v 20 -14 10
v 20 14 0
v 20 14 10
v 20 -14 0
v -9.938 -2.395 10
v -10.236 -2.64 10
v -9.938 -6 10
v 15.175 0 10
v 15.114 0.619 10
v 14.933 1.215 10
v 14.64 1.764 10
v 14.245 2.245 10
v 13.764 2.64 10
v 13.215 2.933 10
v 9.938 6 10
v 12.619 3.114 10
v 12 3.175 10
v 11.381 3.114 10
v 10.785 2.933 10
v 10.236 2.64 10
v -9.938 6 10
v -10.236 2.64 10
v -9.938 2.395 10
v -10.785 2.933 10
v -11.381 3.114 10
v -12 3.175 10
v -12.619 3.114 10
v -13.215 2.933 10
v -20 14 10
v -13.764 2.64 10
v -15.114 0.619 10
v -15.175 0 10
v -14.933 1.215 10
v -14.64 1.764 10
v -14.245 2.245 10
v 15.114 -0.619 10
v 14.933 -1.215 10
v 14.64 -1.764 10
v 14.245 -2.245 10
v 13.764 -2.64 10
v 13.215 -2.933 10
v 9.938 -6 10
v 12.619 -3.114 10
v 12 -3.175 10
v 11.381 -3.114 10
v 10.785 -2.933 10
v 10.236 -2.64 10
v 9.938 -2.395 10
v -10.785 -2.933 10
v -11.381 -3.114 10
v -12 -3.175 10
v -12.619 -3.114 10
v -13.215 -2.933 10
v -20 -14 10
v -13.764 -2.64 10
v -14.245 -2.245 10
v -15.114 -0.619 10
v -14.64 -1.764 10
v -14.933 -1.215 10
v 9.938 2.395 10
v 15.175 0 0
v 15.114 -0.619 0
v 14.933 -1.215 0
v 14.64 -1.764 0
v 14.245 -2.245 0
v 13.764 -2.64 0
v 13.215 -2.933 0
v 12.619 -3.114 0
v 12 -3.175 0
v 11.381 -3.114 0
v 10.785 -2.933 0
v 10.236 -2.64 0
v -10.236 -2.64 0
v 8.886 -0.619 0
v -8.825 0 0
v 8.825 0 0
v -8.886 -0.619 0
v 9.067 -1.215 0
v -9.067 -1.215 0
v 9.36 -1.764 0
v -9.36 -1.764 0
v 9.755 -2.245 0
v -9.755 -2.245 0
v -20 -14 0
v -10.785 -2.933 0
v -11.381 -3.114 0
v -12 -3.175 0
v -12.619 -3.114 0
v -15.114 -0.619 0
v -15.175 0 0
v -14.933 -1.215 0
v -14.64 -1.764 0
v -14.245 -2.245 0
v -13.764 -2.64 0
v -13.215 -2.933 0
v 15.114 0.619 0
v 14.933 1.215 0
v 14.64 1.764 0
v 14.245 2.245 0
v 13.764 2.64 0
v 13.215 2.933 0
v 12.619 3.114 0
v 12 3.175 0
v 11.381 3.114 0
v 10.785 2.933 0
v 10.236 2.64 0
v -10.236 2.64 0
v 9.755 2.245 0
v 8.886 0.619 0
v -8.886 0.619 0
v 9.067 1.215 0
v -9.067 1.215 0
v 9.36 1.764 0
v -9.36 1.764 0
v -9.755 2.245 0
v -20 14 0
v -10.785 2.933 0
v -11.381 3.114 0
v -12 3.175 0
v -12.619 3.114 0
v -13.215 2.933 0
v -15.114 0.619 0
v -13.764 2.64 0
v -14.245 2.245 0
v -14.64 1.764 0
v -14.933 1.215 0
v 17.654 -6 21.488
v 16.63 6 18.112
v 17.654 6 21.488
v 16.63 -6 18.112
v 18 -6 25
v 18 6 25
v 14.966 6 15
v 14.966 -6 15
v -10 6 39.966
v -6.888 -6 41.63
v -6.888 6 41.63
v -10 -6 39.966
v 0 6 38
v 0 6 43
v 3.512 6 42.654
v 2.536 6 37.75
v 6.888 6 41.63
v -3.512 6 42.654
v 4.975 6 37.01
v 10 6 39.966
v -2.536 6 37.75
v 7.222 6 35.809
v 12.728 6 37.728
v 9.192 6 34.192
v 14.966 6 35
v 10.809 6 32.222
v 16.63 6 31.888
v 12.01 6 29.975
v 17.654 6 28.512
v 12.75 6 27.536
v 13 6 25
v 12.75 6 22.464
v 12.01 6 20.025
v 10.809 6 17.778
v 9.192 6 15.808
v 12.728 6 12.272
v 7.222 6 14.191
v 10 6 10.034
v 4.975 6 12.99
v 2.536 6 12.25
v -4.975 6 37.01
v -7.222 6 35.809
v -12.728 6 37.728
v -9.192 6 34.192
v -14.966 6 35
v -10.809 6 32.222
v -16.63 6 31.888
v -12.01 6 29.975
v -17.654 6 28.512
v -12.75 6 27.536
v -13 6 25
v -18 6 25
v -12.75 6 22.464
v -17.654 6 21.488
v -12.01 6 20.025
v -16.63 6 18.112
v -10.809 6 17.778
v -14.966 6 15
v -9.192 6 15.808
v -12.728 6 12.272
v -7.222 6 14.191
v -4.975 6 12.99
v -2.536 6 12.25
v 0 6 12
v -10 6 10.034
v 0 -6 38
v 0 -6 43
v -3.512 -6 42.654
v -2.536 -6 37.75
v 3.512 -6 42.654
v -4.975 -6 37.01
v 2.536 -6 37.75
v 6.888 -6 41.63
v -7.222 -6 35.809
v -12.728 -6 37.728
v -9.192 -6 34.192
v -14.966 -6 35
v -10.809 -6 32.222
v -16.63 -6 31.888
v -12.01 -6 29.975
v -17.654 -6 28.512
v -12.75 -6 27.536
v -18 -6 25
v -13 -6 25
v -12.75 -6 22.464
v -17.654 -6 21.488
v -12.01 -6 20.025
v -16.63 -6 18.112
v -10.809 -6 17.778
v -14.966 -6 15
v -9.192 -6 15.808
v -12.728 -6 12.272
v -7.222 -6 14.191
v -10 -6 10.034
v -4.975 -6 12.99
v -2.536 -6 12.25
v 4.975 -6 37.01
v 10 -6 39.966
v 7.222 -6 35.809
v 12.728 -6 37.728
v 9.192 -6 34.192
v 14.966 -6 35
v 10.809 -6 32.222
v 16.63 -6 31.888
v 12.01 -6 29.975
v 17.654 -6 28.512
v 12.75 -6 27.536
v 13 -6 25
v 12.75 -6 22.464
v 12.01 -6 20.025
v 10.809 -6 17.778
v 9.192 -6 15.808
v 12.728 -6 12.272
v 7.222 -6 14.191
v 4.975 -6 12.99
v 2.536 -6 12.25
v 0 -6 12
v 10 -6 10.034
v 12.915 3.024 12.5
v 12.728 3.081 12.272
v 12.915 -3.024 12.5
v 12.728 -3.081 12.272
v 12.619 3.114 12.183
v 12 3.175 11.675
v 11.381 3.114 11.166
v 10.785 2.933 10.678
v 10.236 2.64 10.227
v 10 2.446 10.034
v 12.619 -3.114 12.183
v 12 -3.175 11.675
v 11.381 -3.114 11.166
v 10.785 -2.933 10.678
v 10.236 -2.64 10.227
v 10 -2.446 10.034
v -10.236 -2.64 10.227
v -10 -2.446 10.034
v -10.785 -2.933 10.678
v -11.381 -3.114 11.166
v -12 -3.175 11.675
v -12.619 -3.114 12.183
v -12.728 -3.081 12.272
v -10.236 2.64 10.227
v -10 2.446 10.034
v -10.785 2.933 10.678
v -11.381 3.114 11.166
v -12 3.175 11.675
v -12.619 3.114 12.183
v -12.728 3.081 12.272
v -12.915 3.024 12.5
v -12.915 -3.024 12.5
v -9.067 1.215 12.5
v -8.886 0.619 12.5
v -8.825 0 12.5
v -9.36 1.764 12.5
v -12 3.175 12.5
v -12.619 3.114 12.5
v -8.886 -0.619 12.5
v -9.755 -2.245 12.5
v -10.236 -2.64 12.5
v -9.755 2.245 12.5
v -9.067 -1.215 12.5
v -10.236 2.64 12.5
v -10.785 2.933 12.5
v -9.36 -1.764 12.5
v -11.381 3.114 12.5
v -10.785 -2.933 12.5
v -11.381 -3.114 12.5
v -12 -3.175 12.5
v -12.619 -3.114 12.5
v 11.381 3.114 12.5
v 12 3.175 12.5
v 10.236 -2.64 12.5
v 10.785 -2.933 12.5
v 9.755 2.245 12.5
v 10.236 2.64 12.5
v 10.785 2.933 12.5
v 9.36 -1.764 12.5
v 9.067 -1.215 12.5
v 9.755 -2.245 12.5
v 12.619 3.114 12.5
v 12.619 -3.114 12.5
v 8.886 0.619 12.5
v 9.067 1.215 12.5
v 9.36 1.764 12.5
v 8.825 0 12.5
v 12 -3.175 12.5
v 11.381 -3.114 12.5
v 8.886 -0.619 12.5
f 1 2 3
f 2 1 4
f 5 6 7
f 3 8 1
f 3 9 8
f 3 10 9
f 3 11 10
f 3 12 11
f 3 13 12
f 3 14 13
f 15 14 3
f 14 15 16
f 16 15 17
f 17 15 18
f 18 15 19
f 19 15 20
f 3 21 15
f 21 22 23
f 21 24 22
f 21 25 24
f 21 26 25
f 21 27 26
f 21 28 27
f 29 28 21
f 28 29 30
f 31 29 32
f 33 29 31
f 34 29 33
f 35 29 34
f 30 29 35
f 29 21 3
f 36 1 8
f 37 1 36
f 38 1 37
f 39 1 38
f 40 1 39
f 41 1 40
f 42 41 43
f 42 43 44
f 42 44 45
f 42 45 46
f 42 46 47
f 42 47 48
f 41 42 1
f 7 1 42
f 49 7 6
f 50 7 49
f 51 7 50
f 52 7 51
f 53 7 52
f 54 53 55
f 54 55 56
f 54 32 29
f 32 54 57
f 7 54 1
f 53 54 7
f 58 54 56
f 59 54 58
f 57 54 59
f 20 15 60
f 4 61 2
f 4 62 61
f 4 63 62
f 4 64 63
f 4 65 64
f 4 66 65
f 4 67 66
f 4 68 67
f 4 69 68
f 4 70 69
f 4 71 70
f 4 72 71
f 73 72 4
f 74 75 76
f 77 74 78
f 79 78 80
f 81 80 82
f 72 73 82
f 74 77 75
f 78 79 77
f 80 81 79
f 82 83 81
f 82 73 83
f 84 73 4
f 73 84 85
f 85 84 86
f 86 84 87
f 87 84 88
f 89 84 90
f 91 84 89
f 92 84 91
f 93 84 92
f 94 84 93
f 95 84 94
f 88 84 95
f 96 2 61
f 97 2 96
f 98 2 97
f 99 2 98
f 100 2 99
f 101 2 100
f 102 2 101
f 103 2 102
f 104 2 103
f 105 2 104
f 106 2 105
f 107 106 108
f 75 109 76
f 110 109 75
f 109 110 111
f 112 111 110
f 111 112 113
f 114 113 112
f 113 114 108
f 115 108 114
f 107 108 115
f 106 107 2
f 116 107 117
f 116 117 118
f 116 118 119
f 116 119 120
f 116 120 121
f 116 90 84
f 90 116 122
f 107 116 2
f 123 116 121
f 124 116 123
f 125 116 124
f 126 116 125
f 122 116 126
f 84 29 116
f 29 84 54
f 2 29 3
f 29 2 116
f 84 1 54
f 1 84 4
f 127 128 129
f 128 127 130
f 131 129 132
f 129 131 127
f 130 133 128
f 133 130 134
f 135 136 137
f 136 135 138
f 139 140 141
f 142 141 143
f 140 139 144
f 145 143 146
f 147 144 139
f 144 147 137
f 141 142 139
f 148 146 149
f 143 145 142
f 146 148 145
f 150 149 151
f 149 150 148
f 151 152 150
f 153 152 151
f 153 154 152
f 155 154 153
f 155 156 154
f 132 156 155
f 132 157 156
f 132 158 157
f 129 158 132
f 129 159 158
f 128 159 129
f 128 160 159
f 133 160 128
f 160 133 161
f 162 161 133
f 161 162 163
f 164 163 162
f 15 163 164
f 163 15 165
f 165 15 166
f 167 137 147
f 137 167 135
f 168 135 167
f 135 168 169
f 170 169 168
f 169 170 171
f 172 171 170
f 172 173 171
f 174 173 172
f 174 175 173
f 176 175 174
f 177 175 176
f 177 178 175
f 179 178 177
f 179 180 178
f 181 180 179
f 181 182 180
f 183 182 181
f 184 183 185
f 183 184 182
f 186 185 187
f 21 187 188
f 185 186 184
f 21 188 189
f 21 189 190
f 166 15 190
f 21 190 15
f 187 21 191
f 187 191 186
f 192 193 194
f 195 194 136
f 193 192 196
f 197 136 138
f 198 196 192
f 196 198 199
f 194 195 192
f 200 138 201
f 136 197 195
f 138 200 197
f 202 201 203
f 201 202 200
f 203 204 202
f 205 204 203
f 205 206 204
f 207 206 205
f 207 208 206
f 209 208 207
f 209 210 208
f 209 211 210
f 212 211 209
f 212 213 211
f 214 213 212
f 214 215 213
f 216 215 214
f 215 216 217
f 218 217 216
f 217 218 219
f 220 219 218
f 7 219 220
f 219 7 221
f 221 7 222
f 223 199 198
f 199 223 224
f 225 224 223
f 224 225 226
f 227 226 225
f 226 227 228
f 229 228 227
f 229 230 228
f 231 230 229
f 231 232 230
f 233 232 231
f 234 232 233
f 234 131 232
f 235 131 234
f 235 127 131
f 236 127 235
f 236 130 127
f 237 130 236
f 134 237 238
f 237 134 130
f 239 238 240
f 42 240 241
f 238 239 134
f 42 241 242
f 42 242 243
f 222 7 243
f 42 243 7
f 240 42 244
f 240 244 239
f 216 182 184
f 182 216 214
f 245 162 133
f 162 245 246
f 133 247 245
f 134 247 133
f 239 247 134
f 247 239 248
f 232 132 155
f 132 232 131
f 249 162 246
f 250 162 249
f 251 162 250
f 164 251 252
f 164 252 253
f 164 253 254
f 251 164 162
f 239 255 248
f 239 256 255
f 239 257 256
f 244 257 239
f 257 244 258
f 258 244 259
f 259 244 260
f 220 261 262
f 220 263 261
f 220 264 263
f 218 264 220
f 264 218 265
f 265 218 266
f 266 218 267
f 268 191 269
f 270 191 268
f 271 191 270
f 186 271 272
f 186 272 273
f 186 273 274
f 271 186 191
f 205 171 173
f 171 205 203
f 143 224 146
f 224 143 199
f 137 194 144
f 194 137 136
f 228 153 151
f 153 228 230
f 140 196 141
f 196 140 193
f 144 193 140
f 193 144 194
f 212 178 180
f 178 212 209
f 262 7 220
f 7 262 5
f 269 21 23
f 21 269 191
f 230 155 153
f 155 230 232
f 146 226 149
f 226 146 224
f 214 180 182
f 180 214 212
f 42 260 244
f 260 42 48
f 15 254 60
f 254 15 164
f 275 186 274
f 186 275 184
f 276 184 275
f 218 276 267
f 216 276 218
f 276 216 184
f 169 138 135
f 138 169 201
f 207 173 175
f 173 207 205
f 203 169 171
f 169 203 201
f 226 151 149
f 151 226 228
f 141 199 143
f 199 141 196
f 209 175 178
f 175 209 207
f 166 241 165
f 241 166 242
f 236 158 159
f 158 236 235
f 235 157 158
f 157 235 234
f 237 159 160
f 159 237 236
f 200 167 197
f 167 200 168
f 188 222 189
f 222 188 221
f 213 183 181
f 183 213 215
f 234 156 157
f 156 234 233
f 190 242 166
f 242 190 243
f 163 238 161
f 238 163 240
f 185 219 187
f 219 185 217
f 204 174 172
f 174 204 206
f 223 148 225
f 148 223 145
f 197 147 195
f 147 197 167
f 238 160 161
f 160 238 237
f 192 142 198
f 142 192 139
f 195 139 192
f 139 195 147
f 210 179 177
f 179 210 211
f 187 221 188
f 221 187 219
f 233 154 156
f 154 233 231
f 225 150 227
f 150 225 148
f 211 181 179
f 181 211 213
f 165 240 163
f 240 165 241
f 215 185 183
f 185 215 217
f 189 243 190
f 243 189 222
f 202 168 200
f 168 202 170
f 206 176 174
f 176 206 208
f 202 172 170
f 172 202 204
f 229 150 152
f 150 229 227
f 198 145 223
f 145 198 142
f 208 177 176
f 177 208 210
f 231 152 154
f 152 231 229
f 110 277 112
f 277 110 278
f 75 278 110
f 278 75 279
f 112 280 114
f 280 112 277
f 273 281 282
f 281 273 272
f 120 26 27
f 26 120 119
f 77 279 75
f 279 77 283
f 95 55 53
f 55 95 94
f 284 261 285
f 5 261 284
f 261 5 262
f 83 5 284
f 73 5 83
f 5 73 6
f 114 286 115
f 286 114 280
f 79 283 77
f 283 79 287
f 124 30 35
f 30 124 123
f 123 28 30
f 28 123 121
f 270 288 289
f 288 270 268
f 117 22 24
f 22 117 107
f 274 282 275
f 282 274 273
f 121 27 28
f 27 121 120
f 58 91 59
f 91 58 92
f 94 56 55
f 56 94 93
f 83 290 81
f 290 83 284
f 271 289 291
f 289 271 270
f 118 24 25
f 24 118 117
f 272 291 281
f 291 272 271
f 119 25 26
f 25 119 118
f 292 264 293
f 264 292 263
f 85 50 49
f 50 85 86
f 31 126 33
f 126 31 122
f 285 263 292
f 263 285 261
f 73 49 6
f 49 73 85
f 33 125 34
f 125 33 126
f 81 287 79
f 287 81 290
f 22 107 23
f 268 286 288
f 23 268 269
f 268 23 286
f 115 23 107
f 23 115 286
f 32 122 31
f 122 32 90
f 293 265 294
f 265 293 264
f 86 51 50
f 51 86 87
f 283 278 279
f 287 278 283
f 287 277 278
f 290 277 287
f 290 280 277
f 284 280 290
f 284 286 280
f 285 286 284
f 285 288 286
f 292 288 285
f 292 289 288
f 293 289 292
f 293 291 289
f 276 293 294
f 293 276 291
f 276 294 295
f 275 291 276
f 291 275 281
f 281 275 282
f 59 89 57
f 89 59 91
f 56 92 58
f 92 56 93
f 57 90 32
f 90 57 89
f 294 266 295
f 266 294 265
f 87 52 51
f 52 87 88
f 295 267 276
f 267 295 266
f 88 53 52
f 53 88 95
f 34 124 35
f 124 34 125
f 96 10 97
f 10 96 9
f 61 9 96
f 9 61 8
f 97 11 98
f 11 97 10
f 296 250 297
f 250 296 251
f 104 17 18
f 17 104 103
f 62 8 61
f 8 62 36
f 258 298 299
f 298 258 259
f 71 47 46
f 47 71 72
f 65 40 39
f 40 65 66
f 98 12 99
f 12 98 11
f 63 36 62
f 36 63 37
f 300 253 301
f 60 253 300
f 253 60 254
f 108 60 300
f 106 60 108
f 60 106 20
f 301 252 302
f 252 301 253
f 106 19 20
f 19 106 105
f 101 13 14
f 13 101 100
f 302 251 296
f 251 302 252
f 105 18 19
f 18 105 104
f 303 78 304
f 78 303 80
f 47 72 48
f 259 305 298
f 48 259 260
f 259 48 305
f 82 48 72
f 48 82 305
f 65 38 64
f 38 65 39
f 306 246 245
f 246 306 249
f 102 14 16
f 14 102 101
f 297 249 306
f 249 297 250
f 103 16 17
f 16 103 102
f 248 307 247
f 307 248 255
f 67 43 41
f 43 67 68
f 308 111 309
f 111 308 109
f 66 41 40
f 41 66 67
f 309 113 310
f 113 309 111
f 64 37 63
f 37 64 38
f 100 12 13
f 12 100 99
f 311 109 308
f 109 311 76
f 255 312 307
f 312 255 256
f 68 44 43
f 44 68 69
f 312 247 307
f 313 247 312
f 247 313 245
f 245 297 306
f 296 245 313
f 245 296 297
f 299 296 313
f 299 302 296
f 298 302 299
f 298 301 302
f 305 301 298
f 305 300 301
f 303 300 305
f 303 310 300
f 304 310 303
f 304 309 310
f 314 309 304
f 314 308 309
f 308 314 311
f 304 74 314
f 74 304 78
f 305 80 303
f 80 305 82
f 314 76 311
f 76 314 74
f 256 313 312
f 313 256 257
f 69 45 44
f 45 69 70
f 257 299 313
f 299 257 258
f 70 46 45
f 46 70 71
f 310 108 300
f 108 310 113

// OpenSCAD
$fn = 32;

// ----------------------------------------------------------------------
// Deck eye: 36 mm eye on a 40 mm base
// ----------------------------------------------------------------------

// --- parameters (mm) ---
base_l = 40;              // base length
base_w = 28;              // base width
base_t = 10;              // base thickness
eye_r = 18;               // eye outside radius
eye_bore = 26;            // eye bore diameter
eye_w = 12;               // eye thickness
eye_z = 25;               // eye centre height
holes_d = 6.35;           // fixing holes
hole_x = 12;              // fixing hole spacing

difference() {
  union() {
    translate([-20, -14, 0]) cube([base_l, base_w, base_t]);
    /* eye standing upright, its foot sunk 3 mm into the base */
    translate([0, -6, 25]) rotate([-90, 0, 0]) cylinder(h = 12, d = 36);
  }
  /* eye bore, 2.5 mm clear of both faces */
  translate([0, -8.5, 25]) rotate([-90, 0, 0]) cylinder(h = 17, d = 26);
  translate([-12, 0, -2.5]) cylinder(h = base_t + 5, d = holes_d);
  translate([12, 0, -2.5]) cylinder(h = base_t + 5, d = holes_d);
}
